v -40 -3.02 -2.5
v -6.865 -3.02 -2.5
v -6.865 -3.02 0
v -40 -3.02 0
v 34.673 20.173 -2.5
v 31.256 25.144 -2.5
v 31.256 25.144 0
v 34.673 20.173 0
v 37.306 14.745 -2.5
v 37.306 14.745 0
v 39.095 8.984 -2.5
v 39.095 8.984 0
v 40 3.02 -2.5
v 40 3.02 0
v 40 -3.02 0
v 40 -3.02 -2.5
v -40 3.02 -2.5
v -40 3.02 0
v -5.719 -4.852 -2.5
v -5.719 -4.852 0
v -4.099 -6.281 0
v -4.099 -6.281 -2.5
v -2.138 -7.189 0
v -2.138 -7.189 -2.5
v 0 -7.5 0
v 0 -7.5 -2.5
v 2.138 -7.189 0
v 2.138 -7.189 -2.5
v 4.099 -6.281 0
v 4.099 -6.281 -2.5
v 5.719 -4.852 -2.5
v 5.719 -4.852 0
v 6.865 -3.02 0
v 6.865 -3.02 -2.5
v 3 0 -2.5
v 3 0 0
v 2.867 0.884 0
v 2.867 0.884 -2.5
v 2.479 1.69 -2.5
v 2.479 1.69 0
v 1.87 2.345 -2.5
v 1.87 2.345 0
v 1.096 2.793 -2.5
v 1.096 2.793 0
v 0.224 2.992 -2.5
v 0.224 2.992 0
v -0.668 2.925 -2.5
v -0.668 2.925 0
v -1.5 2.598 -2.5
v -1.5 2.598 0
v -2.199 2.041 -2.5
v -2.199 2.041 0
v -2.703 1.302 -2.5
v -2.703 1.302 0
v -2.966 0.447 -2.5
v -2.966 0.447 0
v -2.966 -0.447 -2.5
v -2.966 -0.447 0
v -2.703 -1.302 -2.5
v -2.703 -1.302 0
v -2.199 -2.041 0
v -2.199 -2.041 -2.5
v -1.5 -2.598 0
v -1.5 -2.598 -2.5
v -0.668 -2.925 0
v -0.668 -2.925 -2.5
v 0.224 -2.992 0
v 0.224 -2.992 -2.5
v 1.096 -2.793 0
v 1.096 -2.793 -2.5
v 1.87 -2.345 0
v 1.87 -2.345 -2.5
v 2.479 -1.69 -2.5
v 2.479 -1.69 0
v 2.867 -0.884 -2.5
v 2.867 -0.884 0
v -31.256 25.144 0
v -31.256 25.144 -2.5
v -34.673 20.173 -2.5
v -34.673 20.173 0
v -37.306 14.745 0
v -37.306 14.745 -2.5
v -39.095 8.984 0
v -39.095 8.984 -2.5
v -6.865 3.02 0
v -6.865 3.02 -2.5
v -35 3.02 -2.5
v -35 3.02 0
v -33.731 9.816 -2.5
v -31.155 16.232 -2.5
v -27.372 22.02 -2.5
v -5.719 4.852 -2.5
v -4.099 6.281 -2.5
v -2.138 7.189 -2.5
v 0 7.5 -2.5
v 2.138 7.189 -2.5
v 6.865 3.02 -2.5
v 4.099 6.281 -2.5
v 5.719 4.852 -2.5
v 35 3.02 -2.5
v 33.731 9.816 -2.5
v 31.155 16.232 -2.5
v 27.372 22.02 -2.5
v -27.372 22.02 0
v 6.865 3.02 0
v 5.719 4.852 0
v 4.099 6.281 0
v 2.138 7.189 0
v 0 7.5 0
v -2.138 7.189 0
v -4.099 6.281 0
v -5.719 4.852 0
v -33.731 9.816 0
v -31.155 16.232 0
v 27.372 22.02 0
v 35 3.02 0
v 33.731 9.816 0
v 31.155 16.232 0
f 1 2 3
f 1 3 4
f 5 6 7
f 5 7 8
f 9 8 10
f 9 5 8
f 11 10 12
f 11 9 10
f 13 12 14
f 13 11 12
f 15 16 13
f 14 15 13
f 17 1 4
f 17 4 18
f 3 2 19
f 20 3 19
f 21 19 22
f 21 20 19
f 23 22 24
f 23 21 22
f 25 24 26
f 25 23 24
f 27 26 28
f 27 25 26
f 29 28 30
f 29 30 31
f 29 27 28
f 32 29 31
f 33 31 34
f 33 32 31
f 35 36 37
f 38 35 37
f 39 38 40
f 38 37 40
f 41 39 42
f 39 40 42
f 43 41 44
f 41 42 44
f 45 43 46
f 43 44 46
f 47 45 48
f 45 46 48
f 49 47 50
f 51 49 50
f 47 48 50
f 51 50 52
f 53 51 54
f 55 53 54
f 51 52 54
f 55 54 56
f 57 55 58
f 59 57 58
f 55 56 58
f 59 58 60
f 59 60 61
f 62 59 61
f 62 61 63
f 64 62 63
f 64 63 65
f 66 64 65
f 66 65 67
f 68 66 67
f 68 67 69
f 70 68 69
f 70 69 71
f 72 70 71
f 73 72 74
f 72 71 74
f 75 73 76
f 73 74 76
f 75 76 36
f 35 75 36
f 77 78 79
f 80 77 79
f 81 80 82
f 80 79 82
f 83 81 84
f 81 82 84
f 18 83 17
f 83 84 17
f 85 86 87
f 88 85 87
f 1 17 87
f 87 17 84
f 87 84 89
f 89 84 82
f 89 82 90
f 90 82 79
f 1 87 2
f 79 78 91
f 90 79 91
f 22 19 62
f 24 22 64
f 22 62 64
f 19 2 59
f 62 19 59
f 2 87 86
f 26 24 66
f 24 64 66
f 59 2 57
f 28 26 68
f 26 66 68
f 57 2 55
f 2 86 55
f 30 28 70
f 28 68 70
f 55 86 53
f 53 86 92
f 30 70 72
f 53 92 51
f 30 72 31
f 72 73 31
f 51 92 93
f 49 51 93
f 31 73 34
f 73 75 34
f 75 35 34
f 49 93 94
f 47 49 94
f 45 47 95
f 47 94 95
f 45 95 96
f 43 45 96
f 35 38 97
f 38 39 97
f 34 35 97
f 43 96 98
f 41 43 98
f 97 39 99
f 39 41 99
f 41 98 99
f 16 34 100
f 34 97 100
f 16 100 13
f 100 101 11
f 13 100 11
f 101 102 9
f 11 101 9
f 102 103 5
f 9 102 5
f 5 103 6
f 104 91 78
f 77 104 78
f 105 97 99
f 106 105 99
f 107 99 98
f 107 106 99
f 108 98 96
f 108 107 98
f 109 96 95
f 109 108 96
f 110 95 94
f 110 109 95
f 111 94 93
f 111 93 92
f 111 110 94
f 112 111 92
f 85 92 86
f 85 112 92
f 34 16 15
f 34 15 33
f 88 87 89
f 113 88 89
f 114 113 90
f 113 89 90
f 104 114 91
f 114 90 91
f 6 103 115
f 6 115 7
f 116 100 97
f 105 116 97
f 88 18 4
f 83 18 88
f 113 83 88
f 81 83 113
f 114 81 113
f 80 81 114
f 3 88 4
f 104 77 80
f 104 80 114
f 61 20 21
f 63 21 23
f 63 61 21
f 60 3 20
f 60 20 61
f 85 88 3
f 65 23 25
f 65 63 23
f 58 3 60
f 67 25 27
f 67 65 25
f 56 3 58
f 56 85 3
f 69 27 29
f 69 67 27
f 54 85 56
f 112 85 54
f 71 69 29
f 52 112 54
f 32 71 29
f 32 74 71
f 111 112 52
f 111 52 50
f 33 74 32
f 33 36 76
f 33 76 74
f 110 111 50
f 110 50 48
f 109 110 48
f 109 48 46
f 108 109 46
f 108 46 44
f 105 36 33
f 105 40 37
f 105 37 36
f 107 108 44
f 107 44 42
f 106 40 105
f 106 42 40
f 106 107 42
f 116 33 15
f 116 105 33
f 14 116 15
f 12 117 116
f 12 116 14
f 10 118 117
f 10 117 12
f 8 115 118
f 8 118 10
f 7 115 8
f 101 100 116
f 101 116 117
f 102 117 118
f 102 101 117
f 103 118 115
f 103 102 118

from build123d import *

# Parameters (mm, degrees)
SKETCH1_R           = 7.5
SKETCH1_R_2         = 3
BOSS_EXTRUDE1_DEPTH = 2.5
SKETCH2_W           = 80
SKETCH2_H           = 6.039840068
SKETCH2_R           = 3
BOSS_EXTRUDE2_DEPTH = 2.5
BOSS_EXTRUDE3_DEPTH = 2.5


with BuildPart() as part:
    # Sketch1 → Boss-Extrude1 (new body)
    with BuildSketch(Plane.XY):
        Circle(SKETCH1_R)
        Circle(SKETCH1_R_2, mode=Mode.SUBTRACT)
    extrude(amount=-BOSS_EXTRUDE1_DEPTH)

    # Sketch2 → Boss-Extrude2 (add)
    with BuildSketch(Plane(origin=(0, 0, -2.5), x_dir=(-1, 0, 0), z_dir=(0, 0, -1))):
        Rectangle(SKETCH2_W, SKETCH2_H)
        Circle(SKETCH2_R, mode=Mode.SUBTRACT)
    extrude(amount=-BOSS_EXTRUDE2_DEPTH)

    # Sketch4 → Boss-Extrude3 (add)
    with BuildSketch(Plane(origin=(0, 0, -2.5), x_dir=(-1, 0, 0), z_dir=(0, 0, -1))):
        with BuildLine():
            Line((27.372304228, 22.019920034), (31.255531094, 25.143820176))
            ThreePointArc((31.255531094, 25.143820176), (37.305554777, 14.745016099), (40, 3.019920034))
            Line((40, 3.019920034), (35, 3.019920034))
            ThreePointArc((35, 3.019920034), (32.601013537, 13.087927007), (27.372304228, 22.019920034))
        make_face()
        with BuildLine():
            Line((-27.372304228, 22.019920034), (-31.255531094, 25.143820176))
            ThreePointArc((-31.255531094, 25.143820176), (-37.305554777, 14.745016099), (-40, 3.019920034))
            Line((-40, 3.019920034), (-35, 3.019920034))
            ThreePointArc((-35, 3.019920034), (-32.601013537, 13.087927007), (-27.372304228, 22.019920034))
        make_face()
    extrude(amount=-BOSS_EXTRUDE3_DEPTH)


solid = part.part
